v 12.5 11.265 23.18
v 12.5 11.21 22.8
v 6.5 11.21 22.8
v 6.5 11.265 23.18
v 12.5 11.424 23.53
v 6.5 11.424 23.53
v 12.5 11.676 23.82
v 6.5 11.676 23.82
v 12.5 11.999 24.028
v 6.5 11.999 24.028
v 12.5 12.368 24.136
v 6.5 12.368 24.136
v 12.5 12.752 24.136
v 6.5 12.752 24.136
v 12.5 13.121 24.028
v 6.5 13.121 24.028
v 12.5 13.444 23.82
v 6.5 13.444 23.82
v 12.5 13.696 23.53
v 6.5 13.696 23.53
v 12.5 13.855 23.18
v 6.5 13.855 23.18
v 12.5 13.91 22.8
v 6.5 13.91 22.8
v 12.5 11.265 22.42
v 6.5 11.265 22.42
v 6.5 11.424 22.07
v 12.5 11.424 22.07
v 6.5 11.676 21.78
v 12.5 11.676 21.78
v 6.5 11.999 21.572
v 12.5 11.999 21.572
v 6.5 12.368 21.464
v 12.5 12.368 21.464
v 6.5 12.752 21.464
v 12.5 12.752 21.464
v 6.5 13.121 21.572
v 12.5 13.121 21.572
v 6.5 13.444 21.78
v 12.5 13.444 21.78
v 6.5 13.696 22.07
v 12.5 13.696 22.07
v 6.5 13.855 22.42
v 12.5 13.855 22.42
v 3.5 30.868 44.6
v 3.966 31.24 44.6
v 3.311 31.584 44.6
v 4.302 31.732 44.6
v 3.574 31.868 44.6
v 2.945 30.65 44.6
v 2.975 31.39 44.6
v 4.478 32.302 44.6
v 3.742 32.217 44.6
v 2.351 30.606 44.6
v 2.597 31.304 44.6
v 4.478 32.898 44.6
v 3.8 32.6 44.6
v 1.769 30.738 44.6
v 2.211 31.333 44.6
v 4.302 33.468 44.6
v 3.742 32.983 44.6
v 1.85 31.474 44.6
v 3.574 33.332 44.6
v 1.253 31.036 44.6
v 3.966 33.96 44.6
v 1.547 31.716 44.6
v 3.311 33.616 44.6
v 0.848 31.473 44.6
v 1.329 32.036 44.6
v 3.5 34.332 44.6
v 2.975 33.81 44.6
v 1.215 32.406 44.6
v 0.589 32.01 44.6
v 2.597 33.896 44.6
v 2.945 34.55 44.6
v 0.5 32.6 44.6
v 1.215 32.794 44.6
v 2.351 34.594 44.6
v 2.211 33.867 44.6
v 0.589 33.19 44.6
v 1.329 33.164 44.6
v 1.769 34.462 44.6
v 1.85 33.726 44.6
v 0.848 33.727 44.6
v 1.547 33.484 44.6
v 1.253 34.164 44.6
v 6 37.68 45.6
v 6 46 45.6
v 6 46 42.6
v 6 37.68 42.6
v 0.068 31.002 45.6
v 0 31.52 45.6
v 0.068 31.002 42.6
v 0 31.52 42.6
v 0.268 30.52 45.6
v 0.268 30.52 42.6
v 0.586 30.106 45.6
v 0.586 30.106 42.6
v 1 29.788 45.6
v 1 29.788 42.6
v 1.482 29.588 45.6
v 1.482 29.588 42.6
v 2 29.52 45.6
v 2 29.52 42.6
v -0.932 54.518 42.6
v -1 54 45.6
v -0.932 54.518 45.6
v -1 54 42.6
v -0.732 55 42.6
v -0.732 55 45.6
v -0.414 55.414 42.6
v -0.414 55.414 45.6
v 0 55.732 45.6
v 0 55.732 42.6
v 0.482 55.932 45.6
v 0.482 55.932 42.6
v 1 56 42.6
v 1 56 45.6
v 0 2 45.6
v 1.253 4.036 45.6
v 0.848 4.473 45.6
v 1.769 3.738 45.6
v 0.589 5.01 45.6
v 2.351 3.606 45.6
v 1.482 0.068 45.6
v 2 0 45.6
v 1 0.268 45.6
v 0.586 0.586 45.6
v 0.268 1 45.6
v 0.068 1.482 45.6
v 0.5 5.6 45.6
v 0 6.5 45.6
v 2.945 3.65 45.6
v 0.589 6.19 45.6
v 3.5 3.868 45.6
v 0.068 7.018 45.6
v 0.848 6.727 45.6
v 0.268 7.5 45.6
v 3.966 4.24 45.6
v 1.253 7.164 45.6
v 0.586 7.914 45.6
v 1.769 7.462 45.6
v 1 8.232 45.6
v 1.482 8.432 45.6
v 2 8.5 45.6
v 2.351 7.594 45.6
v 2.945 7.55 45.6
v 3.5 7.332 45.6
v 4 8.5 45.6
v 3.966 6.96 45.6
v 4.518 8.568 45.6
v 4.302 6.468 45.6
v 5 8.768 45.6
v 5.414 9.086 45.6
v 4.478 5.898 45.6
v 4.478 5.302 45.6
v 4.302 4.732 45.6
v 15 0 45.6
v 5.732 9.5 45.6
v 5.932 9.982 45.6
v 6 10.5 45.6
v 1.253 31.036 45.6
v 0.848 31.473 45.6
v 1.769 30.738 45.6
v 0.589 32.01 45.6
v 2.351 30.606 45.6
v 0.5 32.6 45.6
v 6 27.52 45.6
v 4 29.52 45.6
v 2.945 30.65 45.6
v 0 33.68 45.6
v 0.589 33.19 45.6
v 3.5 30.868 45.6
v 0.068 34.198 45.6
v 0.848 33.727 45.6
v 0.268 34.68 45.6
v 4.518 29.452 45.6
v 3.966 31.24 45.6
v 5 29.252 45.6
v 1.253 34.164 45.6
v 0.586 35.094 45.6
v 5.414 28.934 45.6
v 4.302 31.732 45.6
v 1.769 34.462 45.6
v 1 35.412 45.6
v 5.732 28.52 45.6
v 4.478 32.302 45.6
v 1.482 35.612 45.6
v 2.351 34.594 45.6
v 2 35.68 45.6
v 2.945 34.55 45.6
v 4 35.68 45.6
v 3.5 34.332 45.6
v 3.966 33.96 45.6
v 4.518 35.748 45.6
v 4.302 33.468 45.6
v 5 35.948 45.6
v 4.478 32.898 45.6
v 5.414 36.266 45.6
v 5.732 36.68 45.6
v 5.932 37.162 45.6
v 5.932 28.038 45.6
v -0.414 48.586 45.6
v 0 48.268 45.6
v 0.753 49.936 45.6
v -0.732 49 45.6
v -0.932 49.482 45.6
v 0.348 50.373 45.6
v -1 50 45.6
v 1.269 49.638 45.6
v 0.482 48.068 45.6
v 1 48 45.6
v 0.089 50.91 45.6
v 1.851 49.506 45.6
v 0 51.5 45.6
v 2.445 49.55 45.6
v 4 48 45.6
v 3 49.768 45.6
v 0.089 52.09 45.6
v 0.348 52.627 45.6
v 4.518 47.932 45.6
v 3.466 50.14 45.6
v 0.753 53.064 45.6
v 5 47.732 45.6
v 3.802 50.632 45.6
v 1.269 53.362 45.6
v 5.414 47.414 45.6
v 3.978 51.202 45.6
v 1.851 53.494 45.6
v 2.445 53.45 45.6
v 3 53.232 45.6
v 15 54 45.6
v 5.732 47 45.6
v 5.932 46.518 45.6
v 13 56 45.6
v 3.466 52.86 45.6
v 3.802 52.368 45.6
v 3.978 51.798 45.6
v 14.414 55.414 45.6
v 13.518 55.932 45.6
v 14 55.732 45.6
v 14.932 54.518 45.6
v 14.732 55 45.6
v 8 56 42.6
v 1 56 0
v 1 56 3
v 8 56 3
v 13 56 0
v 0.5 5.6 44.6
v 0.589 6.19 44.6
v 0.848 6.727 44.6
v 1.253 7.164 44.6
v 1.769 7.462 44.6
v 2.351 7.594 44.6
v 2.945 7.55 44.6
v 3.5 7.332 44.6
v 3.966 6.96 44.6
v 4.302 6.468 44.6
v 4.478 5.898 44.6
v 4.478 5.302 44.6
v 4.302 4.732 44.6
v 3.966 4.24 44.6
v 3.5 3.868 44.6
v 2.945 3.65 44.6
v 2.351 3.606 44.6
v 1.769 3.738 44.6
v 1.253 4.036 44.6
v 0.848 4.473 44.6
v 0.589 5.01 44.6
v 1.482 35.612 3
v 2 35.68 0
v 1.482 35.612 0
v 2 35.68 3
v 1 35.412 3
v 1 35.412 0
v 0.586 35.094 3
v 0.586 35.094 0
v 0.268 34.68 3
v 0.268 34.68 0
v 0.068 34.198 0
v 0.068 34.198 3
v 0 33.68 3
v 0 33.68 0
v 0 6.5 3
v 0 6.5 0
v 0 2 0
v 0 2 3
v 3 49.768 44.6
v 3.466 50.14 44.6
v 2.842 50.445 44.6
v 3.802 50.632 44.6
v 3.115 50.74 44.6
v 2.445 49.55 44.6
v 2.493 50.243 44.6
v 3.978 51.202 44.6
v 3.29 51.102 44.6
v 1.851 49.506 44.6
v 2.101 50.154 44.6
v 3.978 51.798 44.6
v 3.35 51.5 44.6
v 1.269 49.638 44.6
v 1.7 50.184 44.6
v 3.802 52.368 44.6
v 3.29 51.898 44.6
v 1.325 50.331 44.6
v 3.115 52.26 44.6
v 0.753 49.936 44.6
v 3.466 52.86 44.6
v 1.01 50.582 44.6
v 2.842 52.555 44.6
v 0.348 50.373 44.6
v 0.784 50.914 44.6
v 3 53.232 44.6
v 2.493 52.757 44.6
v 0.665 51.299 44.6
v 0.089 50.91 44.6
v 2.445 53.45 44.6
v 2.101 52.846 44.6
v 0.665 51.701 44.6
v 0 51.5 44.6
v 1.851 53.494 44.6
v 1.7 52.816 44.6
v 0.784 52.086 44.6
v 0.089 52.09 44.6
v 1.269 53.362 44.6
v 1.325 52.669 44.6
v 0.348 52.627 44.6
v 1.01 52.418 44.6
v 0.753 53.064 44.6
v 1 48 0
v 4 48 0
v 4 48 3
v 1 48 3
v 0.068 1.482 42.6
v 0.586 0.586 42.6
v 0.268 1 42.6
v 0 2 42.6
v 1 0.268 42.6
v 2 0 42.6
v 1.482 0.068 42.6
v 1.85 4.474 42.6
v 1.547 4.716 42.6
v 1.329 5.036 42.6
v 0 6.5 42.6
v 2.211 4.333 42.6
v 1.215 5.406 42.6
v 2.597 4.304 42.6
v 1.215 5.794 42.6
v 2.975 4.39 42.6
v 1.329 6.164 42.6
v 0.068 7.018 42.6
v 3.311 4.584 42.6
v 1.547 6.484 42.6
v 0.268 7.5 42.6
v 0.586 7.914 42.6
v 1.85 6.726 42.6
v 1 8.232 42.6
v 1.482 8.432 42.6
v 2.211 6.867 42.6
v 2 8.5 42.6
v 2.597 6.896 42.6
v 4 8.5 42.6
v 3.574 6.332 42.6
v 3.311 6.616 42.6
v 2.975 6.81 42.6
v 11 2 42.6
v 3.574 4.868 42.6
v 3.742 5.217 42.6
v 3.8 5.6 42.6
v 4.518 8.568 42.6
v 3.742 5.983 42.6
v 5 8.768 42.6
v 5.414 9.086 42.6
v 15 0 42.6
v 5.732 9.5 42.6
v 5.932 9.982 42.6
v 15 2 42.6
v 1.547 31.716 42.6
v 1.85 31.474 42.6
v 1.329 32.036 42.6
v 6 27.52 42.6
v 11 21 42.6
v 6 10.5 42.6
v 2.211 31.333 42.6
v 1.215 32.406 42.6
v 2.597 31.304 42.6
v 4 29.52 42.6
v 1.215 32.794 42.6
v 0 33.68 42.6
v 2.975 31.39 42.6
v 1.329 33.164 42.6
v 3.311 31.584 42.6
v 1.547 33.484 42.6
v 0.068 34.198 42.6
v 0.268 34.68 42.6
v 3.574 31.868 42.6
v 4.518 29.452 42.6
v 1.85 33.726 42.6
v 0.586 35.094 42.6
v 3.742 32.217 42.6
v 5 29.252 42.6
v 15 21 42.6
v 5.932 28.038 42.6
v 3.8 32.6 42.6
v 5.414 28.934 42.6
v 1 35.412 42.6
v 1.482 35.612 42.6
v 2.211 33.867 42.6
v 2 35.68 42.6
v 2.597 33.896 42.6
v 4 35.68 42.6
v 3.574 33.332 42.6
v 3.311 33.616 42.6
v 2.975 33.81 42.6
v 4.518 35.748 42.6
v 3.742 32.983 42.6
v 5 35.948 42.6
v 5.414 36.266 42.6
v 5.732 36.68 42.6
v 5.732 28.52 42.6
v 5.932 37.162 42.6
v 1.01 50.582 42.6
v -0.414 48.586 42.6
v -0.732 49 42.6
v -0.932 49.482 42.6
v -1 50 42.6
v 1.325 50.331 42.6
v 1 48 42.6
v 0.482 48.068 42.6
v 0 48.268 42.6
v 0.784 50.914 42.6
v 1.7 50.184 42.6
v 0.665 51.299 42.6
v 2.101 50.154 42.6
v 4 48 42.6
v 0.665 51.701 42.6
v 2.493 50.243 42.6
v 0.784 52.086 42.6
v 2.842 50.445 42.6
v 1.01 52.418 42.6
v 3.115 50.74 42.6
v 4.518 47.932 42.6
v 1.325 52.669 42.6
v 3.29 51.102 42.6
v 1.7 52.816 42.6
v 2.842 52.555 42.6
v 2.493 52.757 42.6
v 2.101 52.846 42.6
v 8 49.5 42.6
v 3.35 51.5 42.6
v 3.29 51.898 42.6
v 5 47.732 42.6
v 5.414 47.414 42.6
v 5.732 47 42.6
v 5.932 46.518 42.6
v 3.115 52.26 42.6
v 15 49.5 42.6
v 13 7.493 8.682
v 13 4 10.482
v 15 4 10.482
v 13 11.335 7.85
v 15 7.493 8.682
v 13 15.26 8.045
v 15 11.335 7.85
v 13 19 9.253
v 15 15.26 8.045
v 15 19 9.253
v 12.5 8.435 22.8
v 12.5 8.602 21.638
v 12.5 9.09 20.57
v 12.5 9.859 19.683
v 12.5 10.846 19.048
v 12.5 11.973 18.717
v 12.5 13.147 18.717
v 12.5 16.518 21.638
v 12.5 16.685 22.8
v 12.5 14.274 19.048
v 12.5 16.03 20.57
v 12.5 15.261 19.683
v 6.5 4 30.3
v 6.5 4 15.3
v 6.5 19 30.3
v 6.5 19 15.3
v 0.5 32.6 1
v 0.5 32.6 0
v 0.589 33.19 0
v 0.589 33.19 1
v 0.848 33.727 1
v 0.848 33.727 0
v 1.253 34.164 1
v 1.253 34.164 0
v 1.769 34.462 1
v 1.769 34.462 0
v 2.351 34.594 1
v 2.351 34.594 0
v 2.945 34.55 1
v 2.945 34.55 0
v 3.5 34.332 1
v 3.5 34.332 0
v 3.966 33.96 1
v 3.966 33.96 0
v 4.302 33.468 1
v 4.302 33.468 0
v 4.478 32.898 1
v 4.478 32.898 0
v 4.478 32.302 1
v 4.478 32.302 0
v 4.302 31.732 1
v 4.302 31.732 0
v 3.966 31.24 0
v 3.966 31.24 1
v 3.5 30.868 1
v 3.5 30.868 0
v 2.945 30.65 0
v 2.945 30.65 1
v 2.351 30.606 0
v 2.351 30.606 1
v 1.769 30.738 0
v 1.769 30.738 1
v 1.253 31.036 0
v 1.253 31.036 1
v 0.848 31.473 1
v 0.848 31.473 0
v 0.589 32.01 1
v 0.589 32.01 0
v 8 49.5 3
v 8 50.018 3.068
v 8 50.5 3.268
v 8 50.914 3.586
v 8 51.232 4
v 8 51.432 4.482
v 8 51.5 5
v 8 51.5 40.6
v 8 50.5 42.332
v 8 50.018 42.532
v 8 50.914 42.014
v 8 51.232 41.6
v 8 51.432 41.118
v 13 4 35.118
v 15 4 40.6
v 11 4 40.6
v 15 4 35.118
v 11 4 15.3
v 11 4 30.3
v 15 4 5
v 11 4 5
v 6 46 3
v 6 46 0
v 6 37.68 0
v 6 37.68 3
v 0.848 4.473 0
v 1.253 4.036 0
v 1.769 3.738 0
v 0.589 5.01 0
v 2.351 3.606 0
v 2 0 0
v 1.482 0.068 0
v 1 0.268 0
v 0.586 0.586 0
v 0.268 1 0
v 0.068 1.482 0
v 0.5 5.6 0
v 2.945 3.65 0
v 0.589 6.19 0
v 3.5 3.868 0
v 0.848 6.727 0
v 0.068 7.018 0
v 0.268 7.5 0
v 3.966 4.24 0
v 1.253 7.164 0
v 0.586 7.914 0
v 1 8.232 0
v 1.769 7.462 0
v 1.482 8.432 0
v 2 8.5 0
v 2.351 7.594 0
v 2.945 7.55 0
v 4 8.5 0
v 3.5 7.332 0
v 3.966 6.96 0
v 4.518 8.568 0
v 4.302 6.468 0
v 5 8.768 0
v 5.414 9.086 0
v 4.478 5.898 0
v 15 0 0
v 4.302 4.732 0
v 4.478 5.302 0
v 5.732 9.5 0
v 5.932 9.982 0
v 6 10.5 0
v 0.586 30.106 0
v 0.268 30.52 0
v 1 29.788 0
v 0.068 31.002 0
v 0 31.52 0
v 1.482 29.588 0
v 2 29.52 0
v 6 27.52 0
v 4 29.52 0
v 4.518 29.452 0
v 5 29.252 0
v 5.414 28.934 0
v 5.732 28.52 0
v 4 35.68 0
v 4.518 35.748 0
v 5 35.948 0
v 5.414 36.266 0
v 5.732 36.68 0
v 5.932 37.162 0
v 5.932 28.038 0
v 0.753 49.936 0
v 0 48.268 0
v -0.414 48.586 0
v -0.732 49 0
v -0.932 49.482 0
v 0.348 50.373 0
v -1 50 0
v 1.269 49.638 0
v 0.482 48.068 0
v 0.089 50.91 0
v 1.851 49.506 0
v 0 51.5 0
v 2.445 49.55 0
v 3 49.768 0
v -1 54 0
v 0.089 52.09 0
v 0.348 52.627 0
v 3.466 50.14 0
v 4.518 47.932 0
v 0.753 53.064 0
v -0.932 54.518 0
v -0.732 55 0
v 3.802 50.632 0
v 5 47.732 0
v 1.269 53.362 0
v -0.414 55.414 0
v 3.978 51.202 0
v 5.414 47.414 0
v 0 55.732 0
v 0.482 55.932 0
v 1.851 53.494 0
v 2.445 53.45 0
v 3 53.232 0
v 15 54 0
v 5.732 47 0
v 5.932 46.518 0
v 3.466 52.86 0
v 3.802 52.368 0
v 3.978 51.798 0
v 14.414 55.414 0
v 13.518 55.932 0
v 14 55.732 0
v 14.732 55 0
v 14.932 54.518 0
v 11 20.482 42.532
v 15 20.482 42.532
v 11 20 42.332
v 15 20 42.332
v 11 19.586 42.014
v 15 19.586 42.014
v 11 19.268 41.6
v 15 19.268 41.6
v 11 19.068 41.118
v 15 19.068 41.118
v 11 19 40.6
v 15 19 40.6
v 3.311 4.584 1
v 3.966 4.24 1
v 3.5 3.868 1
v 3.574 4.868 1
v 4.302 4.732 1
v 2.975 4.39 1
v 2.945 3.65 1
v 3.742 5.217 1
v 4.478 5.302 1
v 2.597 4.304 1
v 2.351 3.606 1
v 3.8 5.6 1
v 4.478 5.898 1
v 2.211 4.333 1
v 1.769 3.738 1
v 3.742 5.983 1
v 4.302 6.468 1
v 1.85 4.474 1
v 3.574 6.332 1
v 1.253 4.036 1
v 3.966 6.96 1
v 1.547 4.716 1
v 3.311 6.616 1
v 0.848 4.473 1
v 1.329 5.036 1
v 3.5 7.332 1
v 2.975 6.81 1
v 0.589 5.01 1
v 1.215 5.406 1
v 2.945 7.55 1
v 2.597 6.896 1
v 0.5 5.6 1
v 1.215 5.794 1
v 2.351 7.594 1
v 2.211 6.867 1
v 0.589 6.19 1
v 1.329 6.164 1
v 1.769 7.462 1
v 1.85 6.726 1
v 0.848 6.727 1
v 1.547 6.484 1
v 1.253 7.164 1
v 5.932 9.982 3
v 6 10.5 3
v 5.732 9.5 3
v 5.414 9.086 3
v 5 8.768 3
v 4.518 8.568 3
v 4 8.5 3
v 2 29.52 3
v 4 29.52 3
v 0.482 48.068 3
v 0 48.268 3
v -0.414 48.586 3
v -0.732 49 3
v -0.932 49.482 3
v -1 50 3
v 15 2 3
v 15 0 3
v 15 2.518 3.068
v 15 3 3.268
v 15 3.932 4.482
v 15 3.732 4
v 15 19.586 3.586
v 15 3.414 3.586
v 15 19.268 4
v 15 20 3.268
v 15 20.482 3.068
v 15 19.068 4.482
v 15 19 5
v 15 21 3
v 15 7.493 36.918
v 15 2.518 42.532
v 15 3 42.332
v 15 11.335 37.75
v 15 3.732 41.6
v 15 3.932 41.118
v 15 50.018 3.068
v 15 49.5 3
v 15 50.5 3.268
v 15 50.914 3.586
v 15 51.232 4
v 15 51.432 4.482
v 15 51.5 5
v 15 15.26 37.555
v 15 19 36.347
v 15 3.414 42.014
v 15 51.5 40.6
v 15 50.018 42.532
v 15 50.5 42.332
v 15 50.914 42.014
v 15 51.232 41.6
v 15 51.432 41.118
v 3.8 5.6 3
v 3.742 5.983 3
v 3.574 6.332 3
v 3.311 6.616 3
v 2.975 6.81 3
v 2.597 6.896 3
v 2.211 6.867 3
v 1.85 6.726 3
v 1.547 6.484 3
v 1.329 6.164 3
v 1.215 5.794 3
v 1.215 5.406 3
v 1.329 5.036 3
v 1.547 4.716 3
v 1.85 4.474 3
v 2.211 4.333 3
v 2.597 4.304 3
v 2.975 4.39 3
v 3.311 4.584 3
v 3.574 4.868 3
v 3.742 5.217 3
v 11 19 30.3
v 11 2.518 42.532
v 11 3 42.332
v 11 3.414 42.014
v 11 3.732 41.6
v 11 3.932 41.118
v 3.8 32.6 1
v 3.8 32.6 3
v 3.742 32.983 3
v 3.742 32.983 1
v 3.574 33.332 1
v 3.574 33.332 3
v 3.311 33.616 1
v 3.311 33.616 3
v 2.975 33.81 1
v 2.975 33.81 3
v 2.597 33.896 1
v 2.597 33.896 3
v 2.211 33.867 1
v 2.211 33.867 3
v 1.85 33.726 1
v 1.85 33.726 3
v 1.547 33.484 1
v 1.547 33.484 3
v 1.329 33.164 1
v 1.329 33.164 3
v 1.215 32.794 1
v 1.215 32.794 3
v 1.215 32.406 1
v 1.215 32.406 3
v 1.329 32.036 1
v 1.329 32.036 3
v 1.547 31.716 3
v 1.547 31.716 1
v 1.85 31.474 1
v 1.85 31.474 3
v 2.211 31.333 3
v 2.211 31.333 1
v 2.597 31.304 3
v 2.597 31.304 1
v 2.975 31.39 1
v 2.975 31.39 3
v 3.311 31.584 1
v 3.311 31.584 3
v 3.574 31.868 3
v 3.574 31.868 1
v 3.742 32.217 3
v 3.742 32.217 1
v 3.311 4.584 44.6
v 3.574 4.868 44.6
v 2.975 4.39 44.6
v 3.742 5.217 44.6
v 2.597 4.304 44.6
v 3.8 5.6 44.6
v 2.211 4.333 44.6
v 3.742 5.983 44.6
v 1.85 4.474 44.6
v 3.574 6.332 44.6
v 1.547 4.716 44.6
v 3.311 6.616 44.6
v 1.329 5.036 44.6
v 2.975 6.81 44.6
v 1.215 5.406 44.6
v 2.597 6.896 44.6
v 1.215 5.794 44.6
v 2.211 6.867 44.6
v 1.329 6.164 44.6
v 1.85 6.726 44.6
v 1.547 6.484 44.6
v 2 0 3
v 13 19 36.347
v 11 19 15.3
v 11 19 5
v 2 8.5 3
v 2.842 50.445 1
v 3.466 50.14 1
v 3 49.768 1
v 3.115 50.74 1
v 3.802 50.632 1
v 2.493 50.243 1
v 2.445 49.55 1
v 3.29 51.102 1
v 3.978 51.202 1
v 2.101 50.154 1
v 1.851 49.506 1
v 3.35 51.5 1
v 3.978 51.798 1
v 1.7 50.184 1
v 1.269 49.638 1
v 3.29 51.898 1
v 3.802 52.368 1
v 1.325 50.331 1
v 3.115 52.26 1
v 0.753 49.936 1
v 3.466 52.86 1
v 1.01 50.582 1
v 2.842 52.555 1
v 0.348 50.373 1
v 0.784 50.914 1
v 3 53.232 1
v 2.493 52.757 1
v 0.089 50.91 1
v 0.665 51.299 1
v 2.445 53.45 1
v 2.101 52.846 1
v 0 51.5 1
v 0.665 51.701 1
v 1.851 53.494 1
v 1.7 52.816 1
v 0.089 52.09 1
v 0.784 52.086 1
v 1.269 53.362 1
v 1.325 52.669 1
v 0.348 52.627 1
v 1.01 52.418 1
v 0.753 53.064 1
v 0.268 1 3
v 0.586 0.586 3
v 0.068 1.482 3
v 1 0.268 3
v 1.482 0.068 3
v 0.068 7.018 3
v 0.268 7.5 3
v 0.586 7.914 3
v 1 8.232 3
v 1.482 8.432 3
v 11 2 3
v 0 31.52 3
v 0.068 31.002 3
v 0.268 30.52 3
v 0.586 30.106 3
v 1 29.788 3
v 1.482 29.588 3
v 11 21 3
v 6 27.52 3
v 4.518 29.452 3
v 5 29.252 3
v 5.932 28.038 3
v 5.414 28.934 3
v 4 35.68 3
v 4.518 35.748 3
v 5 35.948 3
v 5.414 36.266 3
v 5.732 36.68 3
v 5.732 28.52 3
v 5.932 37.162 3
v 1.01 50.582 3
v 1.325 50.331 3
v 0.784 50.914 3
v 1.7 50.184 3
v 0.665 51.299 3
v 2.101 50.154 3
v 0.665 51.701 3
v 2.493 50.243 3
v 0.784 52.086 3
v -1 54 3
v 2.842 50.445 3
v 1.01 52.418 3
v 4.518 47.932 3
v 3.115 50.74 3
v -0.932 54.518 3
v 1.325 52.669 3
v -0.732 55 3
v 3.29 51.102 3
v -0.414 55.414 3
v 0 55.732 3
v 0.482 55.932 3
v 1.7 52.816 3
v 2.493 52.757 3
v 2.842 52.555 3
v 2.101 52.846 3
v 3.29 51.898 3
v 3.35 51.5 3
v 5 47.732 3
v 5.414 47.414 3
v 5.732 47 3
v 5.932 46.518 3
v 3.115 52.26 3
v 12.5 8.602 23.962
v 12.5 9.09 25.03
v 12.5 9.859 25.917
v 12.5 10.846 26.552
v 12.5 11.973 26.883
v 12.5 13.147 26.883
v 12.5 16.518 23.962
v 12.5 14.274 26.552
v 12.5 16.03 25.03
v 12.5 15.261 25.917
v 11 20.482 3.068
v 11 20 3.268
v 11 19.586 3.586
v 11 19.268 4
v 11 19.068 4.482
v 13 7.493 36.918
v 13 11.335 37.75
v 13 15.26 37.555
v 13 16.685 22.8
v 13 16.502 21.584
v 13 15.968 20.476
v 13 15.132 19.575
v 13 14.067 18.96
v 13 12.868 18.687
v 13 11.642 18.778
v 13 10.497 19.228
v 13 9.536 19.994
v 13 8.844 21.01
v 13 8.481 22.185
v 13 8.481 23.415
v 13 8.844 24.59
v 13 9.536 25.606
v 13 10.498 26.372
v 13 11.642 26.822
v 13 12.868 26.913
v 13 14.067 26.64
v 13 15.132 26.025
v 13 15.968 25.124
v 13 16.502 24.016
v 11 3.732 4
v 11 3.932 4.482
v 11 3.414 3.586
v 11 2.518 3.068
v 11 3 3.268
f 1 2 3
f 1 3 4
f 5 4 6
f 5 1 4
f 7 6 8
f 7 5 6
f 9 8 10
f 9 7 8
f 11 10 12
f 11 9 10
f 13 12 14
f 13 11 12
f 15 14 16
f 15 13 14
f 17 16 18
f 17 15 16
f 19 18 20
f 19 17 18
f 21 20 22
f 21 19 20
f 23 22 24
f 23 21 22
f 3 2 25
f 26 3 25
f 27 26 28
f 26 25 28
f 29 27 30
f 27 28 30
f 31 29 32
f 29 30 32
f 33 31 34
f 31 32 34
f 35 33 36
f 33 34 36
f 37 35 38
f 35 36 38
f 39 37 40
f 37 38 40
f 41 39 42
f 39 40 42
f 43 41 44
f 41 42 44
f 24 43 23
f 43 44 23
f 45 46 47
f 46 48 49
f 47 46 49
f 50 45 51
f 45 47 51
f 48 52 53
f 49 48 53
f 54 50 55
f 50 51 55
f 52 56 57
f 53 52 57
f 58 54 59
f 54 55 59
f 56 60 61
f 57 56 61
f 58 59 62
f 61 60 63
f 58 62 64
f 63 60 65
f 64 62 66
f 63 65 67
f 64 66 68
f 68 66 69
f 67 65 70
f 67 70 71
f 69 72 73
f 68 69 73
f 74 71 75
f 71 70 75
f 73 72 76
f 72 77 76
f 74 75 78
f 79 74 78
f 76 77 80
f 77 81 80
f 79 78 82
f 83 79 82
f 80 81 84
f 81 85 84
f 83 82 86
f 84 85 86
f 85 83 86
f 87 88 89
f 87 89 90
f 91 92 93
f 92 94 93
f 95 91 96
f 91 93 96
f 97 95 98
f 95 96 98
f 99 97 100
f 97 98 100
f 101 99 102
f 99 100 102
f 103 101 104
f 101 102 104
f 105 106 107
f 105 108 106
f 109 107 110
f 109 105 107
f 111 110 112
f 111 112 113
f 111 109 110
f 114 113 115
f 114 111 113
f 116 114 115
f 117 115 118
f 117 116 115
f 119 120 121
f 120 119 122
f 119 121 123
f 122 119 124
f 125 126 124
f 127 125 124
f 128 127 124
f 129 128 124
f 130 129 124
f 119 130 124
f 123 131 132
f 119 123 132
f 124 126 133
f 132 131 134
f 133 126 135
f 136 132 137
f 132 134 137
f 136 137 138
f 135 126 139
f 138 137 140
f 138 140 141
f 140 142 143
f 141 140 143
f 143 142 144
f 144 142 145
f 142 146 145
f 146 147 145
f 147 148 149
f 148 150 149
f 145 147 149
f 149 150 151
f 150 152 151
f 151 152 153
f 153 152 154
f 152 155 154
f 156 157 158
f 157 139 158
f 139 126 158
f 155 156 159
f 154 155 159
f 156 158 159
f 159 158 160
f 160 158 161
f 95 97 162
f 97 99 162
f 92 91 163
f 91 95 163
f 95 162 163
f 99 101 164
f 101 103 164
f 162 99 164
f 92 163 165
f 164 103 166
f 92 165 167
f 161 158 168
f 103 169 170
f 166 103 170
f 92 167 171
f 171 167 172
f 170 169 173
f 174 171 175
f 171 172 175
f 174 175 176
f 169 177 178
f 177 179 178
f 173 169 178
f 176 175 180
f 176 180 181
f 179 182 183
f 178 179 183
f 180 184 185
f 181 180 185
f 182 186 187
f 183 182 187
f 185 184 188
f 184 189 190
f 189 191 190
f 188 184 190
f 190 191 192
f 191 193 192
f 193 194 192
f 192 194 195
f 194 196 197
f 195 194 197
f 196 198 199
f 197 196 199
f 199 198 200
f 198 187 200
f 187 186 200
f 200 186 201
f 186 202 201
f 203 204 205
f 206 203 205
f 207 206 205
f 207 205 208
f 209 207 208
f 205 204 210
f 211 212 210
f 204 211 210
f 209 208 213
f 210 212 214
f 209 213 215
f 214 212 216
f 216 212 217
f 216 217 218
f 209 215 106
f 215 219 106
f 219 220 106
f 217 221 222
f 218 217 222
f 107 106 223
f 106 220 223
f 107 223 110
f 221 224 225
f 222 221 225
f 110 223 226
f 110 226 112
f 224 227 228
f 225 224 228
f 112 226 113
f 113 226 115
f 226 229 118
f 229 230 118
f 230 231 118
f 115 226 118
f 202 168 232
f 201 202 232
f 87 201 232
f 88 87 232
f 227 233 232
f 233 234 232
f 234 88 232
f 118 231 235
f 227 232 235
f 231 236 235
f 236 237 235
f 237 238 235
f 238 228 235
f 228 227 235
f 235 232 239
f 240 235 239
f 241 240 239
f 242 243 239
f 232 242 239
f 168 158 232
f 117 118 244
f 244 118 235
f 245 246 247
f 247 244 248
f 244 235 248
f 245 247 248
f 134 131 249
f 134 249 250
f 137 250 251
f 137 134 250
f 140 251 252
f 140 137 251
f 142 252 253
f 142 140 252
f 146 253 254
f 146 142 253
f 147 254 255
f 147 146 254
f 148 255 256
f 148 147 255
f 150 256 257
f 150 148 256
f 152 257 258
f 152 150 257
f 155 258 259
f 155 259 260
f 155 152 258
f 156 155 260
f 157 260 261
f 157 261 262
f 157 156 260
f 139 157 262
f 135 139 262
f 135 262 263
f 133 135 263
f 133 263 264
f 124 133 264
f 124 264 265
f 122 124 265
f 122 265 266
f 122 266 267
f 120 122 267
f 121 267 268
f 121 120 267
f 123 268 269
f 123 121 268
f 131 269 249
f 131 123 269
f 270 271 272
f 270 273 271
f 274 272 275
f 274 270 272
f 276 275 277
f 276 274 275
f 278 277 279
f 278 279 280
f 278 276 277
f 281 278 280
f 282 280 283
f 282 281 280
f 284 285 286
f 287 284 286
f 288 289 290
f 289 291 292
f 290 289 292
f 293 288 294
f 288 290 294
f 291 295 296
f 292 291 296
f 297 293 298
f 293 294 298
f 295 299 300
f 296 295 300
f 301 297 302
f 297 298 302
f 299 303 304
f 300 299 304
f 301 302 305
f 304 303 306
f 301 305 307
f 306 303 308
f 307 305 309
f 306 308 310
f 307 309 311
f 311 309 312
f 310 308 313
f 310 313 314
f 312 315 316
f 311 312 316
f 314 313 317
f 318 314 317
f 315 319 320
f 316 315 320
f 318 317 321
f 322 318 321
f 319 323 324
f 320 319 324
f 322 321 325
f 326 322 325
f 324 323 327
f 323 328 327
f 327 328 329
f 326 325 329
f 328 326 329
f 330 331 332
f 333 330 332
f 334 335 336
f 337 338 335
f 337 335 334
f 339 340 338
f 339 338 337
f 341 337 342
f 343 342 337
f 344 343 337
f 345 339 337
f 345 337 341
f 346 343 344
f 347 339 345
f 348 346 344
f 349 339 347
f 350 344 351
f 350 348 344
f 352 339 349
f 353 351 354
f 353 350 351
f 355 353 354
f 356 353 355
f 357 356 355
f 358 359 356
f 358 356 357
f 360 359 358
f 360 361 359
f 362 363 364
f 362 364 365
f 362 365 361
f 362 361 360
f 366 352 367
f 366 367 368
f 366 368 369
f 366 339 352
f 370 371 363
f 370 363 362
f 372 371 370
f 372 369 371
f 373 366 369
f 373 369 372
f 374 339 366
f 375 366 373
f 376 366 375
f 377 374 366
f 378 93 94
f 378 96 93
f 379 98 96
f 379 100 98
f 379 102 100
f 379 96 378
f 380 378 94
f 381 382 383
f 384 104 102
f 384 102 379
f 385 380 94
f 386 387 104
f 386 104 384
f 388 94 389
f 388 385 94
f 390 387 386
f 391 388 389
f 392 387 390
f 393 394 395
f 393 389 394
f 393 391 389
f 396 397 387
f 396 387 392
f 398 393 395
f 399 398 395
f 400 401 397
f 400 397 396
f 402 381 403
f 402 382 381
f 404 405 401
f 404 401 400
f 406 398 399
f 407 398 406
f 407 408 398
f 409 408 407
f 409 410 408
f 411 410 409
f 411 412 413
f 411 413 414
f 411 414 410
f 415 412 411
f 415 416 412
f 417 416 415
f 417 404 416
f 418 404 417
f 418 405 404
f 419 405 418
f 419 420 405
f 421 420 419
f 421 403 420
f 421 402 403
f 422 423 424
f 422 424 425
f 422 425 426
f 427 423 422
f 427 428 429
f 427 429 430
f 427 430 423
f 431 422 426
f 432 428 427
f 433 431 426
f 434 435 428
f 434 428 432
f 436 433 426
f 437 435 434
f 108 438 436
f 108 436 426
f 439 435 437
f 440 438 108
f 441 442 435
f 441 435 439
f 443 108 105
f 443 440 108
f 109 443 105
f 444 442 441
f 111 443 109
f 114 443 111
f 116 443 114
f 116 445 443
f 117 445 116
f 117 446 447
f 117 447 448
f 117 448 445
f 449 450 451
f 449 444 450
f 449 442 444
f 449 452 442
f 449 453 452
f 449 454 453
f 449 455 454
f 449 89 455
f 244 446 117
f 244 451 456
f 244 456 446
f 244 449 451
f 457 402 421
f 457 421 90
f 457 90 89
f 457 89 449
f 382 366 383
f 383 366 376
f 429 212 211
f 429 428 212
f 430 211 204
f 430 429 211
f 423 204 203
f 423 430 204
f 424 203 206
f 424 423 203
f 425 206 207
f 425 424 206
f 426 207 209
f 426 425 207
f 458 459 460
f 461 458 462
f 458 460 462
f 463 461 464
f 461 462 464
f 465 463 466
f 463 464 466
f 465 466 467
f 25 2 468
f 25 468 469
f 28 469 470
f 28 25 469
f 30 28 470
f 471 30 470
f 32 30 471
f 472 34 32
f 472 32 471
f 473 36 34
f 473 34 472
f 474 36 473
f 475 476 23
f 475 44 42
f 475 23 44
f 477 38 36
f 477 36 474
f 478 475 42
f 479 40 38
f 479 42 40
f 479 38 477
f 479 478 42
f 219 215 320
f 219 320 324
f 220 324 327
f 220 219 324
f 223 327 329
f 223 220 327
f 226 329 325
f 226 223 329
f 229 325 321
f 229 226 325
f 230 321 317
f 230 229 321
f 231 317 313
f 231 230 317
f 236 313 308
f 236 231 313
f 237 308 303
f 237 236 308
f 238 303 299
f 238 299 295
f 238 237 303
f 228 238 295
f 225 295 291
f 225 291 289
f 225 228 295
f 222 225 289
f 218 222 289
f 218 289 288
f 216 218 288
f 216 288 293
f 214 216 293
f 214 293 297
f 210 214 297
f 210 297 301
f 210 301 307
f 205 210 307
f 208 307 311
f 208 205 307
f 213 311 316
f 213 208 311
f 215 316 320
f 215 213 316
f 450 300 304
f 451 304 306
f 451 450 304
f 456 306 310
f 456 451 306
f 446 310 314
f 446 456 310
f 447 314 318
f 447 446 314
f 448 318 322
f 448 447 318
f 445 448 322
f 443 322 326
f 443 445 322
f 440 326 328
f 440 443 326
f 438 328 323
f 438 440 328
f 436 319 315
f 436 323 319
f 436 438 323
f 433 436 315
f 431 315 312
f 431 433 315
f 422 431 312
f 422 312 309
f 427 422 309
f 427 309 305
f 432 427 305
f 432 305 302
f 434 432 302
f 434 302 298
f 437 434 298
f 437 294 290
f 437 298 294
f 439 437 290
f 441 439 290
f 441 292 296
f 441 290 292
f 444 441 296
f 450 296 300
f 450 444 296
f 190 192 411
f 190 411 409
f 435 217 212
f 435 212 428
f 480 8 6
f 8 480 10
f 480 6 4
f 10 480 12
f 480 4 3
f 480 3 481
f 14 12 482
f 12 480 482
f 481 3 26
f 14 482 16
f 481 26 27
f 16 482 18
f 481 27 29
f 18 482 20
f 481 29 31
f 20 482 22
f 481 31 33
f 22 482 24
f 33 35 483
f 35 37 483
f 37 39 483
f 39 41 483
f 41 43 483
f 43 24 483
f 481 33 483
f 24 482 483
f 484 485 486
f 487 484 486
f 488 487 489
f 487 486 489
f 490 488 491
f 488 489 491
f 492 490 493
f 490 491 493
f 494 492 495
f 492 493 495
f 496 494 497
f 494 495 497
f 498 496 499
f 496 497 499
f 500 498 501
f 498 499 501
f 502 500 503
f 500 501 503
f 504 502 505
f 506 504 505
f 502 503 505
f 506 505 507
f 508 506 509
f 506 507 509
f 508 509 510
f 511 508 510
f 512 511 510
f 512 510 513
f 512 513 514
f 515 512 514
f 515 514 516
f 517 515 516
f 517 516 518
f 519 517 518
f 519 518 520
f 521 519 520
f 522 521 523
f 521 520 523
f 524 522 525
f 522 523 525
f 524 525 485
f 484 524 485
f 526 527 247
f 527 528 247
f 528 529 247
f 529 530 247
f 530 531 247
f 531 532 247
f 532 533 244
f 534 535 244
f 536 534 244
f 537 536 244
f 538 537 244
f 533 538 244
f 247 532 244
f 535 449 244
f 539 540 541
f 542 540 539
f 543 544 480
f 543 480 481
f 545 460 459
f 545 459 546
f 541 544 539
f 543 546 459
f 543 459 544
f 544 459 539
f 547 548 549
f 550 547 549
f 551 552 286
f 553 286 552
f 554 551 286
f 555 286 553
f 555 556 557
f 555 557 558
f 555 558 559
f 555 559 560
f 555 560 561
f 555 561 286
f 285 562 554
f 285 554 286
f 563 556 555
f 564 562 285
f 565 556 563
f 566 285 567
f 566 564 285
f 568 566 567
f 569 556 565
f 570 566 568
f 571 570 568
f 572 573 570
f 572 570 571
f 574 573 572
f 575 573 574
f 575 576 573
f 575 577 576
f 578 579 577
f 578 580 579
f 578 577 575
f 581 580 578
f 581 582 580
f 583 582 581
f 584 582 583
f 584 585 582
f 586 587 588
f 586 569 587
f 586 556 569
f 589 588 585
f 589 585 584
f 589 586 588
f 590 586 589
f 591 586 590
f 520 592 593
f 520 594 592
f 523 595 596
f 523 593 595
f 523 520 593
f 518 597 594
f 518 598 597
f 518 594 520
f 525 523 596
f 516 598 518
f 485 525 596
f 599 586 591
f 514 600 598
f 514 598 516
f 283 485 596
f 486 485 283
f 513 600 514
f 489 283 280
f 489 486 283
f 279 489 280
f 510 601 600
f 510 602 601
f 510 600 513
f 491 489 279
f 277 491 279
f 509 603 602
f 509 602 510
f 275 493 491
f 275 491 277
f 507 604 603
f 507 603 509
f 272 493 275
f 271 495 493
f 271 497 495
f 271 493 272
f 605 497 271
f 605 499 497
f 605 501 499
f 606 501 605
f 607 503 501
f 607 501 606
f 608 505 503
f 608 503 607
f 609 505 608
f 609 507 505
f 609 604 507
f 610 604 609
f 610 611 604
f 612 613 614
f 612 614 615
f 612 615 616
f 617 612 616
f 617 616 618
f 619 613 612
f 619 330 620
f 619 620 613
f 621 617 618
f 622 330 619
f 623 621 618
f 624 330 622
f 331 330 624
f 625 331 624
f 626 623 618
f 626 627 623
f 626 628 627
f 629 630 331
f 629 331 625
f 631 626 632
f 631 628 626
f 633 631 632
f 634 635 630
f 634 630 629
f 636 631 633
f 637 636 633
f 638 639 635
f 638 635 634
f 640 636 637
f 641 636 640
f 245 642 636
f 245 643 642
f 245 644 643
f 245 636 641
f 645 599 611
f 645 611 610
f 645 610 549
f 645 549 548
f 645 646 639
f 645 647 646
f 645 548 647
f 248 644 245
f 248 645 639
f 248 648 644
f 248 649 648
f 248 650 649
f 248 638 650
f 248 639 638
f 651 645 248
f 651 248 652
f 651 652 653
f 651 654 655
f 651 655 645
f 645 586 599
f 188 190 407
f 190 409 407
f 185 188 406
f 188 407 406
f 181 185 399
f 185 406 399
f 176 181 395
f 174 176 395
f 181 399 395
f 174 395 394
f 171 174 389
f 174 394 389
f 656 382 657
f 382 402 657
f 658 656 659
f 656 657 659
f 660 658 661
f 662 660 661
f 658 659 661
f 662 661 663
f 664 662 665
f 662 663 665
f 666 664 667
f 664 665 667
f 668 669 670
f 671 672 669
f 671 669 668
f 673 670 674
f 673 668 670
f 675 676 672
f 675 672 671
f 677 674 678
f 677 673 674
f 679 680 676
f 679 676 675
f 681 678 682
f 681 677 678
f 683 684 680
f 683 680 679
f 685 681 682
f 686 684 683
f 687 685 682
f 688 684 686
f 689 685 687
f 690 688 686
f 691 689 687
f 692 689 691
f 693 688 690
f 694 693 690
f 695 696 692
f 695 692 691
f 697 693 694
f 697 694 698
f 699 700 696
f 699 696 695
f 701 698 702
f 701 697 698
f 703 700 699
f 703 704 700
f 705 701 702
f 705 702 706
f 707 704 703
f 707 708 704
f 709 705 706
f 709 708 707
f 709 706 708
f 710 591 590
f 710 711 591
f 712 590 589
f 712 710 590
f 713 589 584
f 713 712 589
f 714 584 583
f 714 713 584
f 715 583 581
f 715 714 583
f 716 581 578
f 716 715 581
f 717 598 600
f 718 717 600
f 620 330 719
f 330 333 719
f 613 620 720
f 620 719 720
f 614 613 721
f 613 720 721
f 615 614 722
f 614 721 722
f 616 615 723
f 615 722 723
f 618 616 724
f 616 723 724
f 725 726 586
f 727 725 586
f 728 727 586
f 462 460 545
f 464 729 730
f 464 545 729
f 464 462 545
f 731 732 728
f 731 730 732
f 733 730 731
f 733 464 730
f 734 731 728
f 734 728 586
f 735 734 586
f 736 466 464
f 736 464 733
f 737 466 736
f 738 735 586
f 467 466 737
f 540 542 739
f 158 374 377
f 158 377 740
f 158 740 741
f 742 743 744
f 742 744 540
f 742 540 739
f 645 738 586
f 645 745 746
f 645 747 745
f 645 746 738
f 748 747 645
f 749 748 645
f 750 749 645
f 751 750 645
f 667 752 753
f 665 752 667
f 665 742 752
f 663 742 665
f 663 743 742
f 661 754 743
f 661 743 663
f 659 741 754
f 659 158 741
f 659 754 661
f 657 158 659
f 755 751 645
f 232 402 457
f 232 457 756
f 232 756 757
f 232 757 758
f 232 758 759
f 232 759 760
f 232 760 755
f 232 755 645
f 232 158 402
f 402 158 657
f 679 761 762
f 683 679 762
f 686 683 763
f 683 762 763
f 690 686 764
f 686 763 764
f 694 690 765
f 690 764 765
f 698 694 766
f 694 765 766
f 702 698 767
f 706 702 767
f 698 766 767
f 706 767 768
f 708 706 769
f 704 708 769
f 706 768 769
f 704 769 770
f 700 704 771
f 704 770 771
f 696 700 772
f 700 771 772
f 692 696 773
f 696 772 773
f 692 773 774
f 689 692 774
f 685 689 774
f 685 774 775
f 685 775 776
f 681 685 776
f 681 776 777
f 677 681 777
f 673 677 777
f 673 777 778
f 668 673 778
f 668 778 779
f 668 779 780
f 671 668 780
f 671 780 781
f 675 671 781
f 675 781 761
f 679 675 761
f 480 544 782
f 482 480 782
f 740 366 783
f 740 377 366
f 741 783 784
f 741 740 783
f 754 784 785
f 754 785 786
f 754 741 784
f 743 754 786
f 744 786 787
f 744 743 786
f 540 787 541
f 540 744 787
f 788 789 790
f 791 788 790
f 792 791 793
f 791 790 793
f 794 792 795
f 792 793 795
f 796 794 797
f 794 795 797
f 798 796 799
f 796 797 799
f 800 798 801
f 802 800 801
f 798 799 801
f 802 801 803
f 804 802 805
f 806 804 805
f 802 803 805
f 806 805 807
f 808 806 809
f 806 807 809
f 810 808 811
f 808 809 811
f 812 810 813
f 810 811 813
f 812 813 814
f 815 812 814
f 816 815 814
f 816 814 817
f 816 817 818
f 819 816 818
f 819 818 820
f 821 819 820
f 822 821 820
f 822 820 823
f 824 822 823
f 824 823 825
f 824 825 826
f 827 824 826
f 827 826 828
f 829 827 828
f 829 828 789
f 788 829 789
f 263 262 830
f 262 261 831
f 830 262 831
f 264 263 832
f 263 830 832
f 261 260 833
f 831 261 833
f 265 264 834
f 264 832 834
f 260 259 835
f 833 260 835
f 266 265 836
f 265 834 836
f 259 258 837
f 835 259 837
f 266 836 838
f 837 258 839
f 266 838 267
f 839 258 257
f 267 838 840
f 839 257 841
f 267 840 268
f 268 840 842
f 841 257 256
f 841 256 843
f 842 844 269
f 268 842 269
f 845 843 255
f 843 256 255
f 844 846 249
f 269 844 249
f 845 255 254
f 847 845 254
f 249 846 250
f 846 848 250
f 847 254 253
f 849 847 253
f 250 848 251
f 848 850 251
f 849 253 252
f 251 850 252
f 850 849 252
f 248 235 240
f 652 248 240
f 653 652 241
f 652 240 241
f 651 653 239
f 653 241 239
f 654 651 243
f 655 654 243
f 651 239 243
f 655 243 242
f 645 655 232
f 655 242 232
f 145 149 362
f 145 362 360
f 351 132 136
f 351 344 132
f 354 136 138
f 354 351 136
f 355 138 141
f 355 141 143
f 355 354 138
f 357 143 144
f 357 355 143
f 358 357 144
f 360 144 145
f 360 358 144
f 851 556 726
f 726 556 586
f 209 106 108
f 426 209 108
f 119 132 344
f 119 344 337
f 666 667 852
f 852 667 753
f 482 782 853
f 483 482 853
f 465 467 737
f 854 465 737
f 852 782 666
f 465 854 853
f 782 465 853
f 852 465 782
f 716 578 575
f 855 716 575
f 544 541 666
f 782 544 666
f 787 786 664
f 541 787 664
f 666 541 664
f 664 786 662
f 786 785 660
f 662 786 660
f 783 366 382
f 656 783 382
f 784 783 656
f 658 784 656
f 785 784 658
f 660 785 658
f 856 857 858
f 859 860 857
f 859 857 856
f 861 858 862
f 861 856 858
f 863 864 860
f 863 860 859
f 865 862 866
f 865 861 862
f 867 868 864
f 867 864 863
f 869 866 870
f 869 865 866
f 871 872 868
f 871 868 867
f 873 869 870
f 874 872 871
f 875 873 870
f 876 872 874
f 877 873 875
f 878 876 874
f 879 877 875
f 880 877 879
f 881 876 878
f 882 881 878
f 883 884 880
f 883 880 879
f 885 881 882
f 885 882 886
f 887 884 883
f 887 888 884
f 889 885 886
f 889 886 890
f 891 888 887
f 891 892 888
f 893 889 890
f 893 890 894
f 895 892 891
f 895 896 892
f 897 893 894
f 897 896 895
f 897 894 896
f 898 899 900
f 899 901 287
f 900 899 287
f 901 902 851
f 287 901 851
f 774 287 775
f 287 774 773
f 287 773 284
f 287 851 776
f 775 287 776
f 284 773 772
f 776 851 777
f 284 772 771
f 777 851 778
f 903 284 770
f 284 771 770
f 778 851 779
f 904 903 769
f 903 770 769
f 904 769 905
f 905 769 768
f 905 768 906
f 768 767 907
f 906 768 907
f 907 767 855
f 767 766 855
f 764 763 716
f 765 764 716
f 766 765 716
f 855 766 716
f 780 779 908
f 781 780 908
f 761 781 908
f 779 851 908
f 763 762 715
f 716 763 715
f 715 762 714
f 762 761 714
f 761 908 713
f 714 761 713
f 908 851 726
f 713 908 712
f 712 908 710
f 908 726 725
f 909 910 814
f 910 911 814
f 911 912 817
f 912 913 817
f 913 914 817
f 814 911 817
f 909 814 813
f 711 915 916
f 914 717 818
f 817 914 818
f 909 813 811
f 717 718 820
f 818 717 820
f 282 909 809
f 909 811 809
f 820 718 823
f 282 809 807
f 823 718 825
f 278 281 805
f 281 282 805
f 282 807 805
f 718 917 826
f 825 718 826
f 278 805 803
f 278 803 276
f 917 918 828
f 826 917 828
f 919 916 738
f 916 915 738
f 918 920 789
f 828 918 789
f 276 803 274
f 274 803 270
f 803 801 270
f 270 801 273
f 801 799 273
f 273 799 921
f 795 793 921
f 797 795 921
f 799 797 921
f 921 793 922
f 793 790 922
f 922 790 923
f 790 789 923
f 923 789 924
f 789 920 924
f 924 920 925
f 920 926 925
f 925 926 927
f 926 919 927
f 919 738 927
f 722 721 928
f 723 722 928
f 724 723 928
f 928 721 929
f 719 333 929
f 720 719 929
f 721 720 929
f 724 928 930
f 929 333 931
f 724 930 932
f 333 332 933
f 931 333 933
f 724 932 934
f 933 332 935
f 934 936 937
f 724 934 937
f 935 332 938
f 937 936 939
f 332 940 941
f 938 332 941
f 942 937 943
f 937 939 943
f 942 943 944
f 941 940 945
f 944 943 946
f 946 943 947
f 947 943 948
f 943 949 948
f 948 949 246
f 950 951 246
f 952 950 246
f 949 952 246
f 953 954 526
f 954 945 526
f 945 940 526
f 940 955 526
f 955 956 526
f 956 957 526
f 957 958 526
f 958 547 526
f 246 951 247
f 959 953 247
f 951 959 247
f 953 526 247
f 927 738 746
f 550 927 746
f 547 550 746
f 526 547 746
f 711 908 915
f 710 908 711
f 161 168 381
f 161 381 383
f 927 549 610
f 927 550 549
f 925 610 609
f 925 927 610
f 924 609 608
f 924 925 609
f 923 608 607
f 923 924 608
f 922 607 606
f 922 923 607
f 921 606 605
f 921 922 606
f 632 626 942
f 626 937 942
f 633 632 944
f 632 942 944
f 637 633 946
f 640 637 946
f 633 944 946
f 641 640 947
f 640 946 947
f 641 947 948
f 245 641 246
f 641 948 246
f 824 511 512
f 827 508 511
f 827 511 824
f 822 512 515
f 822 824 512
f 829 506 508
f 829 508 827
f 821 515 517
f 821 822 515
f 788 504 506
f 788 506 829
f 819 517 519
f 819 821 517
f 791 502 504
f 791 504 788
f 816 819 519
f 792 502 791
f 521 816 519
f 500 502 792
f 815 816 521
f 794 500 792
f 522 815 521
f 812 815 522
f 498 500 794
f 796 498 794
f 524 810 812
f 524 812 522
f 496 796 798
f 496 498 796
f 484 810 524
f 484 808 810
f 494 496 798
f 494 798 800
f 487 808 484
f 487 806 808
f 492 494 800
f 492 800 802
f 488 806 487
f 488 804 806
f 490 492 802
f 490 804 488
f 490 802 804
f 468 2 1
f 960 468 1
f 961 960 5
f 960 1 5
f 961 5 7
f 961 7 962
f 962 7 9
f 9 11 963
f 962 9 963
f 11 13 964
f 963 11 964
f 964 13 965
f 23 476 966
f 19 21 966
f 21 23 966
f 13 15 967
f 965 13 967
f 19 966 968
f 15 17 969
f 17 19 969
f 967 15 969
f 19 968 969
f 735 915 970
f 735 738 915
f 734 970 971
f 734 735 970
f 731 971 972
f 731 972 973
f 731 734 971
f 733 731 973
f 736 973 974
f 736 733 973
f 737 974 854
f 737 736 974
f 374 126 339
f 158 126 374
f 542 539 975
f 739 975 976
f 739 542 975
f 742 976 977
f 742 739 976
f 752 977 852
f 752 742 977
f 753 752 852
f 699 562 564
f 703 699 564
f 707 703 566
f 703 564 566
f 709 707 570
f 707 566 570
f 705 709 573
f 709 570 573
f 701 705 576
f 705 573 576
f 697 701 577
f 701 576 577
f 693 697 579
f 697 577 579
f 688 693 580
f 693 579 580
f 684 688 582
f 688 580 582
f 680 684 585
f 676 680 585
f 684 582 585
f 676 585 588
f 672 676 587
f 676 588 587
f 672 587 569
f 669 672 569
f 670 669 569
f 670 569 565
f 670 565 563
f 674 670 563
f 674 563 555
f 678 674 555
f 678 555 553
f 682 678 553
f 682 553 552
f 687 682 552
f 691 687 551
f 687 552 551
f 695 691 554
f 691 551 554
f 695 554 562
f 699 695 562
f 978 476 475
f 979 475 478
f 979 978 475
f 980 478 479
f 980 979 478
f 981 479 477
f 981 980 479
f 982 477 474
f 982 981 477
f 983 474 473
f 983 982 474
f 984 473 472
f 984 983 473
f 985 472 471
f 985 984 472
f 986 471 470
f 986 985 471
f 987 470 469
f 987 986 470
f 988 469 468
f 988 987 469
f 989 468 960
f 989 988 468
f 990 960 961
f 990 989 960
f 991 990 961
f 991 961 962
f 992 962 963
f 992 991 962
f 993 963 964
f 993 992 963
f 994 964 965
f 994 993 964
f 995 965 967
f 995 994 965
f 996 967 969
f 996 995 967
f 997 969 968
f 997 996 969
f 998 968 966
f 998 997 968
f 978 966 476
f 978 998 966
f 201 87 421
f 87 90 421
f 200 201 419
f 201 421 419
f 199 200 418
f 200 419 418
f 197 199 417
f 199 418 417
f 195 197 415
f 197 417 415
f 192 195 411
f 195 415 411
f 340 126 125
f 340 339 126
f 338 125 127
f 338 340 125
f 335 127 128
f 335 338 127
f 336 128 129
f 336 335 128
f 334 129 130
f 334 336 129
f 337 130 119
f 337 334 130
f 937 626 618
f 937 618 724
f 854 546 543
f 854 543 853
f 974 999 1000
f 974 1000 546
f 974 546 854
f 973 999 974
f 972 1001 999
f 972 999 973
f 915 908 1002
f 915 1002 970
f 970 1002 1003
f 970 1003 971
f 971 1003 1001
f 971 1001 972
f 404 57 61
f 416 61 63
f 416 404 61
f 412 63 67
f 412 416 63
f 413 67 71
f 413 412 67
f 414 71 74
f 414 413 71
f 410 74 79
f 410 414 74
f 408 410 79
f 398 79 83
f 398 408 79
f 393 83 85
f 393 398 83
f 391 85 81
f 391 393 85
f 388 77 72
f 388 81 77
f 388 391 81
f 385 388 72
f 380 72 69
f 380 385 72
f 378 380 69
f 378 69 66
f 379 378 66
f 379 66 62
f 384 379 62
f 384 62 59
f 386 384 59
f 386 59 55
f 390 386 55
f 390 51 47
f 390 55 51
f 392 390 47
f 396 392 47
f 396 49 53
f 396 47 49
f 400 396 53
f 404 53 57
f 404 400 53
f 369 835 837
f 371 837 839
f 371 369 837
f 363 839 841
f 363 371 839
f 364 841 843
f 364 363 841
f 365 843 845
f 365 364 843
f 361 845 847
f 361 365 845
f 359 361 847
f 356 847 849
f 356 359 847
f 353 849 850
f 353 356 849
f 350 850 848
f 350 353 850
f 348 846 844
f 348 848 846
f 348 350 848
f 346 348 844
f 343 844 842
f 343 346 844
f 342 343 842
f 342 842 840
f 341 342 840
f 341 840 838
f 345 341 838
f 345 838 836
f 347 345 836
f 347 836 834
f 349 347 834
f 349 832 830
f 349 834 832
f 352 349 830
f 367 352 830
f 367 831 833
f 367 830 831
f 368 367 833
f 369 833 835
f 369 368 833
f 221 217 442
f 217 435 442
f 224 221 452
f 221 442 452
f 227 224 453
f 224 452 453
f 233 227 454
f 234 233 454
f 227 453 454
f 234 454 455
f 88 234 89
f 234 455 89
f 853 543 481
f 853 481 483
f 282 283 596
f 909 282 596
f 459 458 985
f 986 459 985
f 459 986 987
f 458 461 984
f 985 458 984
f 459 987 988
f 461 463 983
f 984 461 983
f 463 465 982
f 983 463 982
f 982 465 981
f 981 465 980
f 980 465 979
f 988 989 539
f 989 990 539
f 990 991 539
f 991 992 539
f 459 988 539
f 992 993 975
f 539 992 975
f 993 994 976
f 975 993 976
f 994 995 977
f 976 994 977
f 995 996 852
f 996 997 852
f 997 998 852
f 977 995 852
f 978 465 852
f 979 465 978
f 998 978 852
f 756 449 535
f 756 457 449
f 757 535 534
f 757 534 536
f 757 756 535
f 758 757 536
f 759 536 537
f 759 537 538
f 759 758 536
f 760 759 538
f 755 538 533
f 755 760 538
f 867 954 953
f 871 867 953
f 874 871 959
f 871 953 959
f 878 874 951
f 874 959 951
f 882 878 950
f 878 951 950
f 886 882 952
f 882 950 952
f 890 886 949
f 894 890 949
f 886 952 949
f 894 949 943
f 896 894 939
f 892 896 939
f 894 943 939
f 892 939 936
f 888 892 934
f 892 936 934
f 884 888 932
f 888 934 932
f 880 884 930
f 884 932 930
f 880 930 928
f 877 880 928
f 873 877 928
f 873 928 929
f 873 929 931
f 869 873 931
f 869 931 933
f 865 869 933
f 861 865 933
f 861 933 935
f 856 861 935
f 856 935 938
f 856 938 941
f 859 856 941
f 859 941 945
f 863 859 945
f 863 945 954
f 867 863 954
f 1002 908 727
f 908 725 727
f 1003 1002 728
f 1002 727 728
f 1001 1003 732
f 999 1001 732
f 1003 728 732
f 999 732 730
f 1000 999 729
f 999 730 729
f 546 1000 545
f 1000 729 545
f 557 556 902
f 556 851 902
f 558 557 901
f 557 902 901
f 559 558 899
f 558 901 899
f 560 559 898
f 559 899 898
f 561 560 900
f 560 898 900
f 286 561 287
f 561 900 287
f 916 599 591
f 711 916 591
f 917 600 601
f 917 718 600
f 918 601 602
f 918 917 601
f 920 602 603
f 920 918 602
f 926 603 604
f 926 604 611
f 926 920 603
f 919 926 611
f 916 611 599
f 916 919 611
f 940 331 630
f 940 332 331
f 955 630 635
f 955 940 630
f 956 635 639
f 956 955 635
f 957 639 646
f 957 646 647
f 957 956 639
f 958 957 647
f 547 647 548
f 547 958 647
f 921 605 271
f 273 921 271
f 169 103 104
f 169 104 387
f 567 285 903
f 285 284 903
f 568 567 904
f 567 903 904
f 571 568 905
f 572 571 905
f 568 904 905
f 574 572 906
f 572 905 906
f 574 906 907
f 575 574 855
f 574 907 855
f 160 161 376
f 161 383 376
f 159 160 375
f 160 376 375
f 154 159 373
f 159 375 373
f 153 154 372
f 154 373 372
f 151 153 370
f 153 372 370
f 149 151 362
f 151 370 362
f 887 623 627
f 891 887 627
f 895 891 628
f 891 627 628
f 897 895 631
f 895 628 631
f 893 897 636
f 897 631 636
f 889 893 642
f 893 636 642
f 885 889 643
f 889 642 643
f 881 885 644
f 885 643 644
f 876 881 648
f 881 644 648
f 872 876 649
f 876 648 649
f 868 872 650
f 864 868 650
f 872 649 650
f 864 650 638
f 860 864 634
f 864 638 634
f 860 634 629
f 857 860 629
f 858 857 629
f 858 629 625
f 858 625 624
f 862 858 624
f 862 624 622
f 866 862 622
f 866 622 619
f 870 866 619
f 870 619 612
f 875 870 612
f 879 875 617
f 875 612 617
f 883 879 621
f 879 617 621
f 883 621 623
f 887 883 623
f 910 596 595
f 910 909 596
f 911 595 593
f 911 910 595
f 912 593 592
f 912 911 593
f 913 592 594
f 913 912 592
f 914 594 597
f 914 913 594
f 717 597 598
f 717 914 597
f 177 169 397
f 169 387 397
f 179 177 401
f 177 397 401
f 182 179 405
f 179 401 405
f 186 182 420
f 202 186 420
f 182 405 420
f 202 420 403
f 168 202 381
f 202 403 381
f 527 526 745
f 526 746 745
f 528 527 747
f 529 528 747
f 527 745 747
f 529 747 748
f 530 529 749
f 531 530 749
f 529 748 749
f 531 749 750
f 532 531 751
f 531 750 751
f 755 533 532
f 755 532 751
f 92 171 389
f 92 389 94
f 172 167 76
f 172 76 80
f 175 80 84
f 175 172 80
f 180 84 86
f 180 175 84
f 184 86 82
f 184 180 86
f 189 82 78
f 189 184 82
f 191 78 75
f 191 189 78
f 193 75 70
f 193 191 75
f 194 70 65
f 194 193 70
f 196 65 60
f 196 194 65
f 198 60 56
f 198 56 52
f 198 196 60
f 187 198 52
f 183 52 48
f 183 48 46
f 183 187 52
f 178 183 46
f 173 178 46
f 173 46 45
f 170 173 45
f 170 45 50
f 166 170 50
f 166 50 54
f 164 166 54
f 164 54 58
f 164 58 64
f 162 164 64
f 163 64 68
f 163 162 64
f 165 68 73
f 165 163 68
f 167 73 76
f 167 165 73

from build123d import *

# Parameters (mm, degrees)
BOSS_EXTRUDE1_DEPTH = 3
SKETCH2_R           = 1.35
SKETCH2_R_2         = 1.3
CUT_EXTRUDE1_DEPTH  = 59.051701095
SKETCH3_W           = 7
SKETCH3_H           = 4.5
BOSS_EXTRUDE2_DEPTH = 19.8
SKETCH4_W           = 4
SKETCH4_H           = 15
BOSS_EXTRUDE3_DEPTH = 19.8
CUT_EXTRUDE2_DEPTH  = 2
SKETCH7_R           = 4.125
CUT_EXTRUDE3_DEPTH  = 0.5
SKETCH9_W           = 7.5
SKETCH9_H           = 15
BOSS_EXTRUDE4_DEPTH = 4.5
SKETCH12_R          = 1.35
CUT_EXTRUDE4_DEPTH  = 62.742125004
SKETCH13_W          = 3
SKETCH13_H          = 8
BOSS_EXTRUDE5_DEPTH = 1
FILLET1_R           = 2
SKETCH14_R          = 2
CUT_EXTRUDE5_DEPTH  = 1


with BuildPart() as part:
    # Sketch1 → Boss-Extrude1 (new body)
    with BuildSketch(Plane.XY):
        Polygon((0, 48), (6, 48), (6, 35.68), (0, 35.68), (0, 29.52), (6, 29.52), (6, 8.5), (0, 8.5), (0, 0), (15, 0), (15, 56), (0, 56), align=None)
    extrude(amount=BOSS_EXTRUDE1_DEPTH)

    # Sketch2 → Cut-Extrude1 (cut, through all)
    with BuildSketch(Plane.XY.offset(3)):
        with Locations((2, 51.5)):
            Circle(SKETCH2_R)
        with Locations((2.5, 5.6)):
            Circle(SKETCH2_R_2)
        with Locations((2.5, 32.6)):
            Circle(SKETCH2_R_2)
    extrude(amount=-CUT_EXTRUDE1_DEPTH, mode=Mode.SUBTRACT)

    # Sketch3 → Boss-Extrude2 (add)
    with BuildSketch(Plane.XY.offset(3)):
        with Locations((11.5, 53.75)):
            Rectangle(SKETCH3_W, SKETCH3_H)
    extrude(amount=BOSS_EXTRUDE2_DEPTH)

    # Sketch4 → Boss-Extrude3 (add)
    with BuildSketch(Plane.XY.offset(3)):
        with Locations((13, 11.5)):
            Rectangle(SKETCH4_W, SKETCH4_H)
    extrude(amount=BOSS_EXTRUDE3_DEPTH)

    # Sketch5 → Cut-Extrude2 (cut)
    with BuildSketch(Plane(origin=(15, 0, 0), x_dir=(0, 0, -1), z_dir=(1, 0, 0))):
        with BuildLine():
            Line((-9.252808409, 19), (-22.8, 19))
            Line((-22.8, 19), (-22.8, 4))
            Line((-22.8, 4), (-22.8, -2.44))
            ThreePointArc((-22.8, -2.44), (-12.193398282, 1.953398282), (-7.8, 12.56))
            ThreePointArc((-7.8, 12.56), (-8.167709102, 15.860918519), (-9.252808409, 19))
        make_face()
    extrude(amount=-CUT_EXTRUDE2_DEPTH, mode=Mode.SUBTRACT)

    # Sketch7 → Cut-Extrude3 (cut)
    with BuildSketch(Plane(origin=(13, 0, 0), x_dir=(0, 0, -1), z_dir=(1, 0, 0))):
        with Locations((-22.8, 12.56)):
            Circle(SKETCH7_R)
    extrude(amount=-CUT_EXTRUDE3_DEPTH, mode=Mode.SUBTRACT)

    # Sketch9 → Boss-Extrude4 (add)
    with BuildSketch(Plane.ZY.offset(-11)):
        with Locations((19.05, 11.5)):
            Rectangle(SKETCH9_W, SKETCH9_H)
    extrude(amount=BOSS_EXTRUDE4_DEPTH)

    # Sketch12 → Cut-Extrude4 (cut, through all)
    with BuildSketch(Plane(origin=(12.5, 0, 0), x_dir=(0, 0, -1), z_dir=(1, 0, 0))):
        with Locations((-22.8, 12.56)):
            Circle(SKETCH12_R)
    extrude(amount=-CUT_EXTRUDE4_DEPTH, mode=Mode.SUBTRACT)

    # Sketch13 → Boss-Extrude5 (add)
    with BuildSketch(Plane.ZY):
        with Locations((1.5, 52)):
            Rectangle(SKETCH13_W, SKETCH13_H)
    extrude(amount=BOSS_EXTRUDE5_DEPTH)

    # Fillet1
    fillet1_edges = [part.edges().sort_by_distance(p)[0] for p in [
        (6, 8.5, 1.5),
        (6, 29.52, 1.5),
        (6, 35.68, 1.5),
        (6, 48, 1.5),
        (11.5, 51.5, 3),
        (13, 4, 3),
        (13, 19, 3),
    ]]
    fillet(fillet1_edges, radius=FILLET1_R)
    fillet1_2_edges = [part.edges().sort_by_distance(p)[0] for p in [
        (0, 8.5, 1.5),
        (0, 29.52, 1.5),
        (0, 35.68, 1.5),
        (15, 56, 11.4),
        (0, 0, 1.5),
        (-1, 56, 1.5),
        (-1, 48, 1.5),
    ]]
    fillet(fillet1_2_edges, radius=FILLET1_R)

    # Mirror1: part across plane


with BuildPart() as part_1:
    add(part.part)
    add(part.part.mirror(Plane.XY.offset(22.8)))

    # Sketch14 → Cut-Extrude5 (cut)
    with BuildSketch(Plane(origin=(0, 0, 0), x_dir=(-1, 0, 0), z_dir=(0, 0, -1))):
        with Locations((-2, 51.5)):
            Circle(SKETCH14_R)
        with Locations((-2.5, 32.6)):
            Circle(SKETCH14_R)
        with Locations((-2.5, 5.6)):
            Circle(SKETCH14_R)
    cut_extrude5 = extrude(amount=-CUT_EXTRUDE5_DEPTH, mode=Mode.SUBTRACT)

    # Mirror2: Cut-Extrude5 across plane
    add(cut_extrude5.mirror(Plane(origin=(0, 0, 22.8), x_dir=(1, 0, 0), z_dir=(0, 0, -1))), mode=Mode.SUBTRACT)


solid = part_1.part
